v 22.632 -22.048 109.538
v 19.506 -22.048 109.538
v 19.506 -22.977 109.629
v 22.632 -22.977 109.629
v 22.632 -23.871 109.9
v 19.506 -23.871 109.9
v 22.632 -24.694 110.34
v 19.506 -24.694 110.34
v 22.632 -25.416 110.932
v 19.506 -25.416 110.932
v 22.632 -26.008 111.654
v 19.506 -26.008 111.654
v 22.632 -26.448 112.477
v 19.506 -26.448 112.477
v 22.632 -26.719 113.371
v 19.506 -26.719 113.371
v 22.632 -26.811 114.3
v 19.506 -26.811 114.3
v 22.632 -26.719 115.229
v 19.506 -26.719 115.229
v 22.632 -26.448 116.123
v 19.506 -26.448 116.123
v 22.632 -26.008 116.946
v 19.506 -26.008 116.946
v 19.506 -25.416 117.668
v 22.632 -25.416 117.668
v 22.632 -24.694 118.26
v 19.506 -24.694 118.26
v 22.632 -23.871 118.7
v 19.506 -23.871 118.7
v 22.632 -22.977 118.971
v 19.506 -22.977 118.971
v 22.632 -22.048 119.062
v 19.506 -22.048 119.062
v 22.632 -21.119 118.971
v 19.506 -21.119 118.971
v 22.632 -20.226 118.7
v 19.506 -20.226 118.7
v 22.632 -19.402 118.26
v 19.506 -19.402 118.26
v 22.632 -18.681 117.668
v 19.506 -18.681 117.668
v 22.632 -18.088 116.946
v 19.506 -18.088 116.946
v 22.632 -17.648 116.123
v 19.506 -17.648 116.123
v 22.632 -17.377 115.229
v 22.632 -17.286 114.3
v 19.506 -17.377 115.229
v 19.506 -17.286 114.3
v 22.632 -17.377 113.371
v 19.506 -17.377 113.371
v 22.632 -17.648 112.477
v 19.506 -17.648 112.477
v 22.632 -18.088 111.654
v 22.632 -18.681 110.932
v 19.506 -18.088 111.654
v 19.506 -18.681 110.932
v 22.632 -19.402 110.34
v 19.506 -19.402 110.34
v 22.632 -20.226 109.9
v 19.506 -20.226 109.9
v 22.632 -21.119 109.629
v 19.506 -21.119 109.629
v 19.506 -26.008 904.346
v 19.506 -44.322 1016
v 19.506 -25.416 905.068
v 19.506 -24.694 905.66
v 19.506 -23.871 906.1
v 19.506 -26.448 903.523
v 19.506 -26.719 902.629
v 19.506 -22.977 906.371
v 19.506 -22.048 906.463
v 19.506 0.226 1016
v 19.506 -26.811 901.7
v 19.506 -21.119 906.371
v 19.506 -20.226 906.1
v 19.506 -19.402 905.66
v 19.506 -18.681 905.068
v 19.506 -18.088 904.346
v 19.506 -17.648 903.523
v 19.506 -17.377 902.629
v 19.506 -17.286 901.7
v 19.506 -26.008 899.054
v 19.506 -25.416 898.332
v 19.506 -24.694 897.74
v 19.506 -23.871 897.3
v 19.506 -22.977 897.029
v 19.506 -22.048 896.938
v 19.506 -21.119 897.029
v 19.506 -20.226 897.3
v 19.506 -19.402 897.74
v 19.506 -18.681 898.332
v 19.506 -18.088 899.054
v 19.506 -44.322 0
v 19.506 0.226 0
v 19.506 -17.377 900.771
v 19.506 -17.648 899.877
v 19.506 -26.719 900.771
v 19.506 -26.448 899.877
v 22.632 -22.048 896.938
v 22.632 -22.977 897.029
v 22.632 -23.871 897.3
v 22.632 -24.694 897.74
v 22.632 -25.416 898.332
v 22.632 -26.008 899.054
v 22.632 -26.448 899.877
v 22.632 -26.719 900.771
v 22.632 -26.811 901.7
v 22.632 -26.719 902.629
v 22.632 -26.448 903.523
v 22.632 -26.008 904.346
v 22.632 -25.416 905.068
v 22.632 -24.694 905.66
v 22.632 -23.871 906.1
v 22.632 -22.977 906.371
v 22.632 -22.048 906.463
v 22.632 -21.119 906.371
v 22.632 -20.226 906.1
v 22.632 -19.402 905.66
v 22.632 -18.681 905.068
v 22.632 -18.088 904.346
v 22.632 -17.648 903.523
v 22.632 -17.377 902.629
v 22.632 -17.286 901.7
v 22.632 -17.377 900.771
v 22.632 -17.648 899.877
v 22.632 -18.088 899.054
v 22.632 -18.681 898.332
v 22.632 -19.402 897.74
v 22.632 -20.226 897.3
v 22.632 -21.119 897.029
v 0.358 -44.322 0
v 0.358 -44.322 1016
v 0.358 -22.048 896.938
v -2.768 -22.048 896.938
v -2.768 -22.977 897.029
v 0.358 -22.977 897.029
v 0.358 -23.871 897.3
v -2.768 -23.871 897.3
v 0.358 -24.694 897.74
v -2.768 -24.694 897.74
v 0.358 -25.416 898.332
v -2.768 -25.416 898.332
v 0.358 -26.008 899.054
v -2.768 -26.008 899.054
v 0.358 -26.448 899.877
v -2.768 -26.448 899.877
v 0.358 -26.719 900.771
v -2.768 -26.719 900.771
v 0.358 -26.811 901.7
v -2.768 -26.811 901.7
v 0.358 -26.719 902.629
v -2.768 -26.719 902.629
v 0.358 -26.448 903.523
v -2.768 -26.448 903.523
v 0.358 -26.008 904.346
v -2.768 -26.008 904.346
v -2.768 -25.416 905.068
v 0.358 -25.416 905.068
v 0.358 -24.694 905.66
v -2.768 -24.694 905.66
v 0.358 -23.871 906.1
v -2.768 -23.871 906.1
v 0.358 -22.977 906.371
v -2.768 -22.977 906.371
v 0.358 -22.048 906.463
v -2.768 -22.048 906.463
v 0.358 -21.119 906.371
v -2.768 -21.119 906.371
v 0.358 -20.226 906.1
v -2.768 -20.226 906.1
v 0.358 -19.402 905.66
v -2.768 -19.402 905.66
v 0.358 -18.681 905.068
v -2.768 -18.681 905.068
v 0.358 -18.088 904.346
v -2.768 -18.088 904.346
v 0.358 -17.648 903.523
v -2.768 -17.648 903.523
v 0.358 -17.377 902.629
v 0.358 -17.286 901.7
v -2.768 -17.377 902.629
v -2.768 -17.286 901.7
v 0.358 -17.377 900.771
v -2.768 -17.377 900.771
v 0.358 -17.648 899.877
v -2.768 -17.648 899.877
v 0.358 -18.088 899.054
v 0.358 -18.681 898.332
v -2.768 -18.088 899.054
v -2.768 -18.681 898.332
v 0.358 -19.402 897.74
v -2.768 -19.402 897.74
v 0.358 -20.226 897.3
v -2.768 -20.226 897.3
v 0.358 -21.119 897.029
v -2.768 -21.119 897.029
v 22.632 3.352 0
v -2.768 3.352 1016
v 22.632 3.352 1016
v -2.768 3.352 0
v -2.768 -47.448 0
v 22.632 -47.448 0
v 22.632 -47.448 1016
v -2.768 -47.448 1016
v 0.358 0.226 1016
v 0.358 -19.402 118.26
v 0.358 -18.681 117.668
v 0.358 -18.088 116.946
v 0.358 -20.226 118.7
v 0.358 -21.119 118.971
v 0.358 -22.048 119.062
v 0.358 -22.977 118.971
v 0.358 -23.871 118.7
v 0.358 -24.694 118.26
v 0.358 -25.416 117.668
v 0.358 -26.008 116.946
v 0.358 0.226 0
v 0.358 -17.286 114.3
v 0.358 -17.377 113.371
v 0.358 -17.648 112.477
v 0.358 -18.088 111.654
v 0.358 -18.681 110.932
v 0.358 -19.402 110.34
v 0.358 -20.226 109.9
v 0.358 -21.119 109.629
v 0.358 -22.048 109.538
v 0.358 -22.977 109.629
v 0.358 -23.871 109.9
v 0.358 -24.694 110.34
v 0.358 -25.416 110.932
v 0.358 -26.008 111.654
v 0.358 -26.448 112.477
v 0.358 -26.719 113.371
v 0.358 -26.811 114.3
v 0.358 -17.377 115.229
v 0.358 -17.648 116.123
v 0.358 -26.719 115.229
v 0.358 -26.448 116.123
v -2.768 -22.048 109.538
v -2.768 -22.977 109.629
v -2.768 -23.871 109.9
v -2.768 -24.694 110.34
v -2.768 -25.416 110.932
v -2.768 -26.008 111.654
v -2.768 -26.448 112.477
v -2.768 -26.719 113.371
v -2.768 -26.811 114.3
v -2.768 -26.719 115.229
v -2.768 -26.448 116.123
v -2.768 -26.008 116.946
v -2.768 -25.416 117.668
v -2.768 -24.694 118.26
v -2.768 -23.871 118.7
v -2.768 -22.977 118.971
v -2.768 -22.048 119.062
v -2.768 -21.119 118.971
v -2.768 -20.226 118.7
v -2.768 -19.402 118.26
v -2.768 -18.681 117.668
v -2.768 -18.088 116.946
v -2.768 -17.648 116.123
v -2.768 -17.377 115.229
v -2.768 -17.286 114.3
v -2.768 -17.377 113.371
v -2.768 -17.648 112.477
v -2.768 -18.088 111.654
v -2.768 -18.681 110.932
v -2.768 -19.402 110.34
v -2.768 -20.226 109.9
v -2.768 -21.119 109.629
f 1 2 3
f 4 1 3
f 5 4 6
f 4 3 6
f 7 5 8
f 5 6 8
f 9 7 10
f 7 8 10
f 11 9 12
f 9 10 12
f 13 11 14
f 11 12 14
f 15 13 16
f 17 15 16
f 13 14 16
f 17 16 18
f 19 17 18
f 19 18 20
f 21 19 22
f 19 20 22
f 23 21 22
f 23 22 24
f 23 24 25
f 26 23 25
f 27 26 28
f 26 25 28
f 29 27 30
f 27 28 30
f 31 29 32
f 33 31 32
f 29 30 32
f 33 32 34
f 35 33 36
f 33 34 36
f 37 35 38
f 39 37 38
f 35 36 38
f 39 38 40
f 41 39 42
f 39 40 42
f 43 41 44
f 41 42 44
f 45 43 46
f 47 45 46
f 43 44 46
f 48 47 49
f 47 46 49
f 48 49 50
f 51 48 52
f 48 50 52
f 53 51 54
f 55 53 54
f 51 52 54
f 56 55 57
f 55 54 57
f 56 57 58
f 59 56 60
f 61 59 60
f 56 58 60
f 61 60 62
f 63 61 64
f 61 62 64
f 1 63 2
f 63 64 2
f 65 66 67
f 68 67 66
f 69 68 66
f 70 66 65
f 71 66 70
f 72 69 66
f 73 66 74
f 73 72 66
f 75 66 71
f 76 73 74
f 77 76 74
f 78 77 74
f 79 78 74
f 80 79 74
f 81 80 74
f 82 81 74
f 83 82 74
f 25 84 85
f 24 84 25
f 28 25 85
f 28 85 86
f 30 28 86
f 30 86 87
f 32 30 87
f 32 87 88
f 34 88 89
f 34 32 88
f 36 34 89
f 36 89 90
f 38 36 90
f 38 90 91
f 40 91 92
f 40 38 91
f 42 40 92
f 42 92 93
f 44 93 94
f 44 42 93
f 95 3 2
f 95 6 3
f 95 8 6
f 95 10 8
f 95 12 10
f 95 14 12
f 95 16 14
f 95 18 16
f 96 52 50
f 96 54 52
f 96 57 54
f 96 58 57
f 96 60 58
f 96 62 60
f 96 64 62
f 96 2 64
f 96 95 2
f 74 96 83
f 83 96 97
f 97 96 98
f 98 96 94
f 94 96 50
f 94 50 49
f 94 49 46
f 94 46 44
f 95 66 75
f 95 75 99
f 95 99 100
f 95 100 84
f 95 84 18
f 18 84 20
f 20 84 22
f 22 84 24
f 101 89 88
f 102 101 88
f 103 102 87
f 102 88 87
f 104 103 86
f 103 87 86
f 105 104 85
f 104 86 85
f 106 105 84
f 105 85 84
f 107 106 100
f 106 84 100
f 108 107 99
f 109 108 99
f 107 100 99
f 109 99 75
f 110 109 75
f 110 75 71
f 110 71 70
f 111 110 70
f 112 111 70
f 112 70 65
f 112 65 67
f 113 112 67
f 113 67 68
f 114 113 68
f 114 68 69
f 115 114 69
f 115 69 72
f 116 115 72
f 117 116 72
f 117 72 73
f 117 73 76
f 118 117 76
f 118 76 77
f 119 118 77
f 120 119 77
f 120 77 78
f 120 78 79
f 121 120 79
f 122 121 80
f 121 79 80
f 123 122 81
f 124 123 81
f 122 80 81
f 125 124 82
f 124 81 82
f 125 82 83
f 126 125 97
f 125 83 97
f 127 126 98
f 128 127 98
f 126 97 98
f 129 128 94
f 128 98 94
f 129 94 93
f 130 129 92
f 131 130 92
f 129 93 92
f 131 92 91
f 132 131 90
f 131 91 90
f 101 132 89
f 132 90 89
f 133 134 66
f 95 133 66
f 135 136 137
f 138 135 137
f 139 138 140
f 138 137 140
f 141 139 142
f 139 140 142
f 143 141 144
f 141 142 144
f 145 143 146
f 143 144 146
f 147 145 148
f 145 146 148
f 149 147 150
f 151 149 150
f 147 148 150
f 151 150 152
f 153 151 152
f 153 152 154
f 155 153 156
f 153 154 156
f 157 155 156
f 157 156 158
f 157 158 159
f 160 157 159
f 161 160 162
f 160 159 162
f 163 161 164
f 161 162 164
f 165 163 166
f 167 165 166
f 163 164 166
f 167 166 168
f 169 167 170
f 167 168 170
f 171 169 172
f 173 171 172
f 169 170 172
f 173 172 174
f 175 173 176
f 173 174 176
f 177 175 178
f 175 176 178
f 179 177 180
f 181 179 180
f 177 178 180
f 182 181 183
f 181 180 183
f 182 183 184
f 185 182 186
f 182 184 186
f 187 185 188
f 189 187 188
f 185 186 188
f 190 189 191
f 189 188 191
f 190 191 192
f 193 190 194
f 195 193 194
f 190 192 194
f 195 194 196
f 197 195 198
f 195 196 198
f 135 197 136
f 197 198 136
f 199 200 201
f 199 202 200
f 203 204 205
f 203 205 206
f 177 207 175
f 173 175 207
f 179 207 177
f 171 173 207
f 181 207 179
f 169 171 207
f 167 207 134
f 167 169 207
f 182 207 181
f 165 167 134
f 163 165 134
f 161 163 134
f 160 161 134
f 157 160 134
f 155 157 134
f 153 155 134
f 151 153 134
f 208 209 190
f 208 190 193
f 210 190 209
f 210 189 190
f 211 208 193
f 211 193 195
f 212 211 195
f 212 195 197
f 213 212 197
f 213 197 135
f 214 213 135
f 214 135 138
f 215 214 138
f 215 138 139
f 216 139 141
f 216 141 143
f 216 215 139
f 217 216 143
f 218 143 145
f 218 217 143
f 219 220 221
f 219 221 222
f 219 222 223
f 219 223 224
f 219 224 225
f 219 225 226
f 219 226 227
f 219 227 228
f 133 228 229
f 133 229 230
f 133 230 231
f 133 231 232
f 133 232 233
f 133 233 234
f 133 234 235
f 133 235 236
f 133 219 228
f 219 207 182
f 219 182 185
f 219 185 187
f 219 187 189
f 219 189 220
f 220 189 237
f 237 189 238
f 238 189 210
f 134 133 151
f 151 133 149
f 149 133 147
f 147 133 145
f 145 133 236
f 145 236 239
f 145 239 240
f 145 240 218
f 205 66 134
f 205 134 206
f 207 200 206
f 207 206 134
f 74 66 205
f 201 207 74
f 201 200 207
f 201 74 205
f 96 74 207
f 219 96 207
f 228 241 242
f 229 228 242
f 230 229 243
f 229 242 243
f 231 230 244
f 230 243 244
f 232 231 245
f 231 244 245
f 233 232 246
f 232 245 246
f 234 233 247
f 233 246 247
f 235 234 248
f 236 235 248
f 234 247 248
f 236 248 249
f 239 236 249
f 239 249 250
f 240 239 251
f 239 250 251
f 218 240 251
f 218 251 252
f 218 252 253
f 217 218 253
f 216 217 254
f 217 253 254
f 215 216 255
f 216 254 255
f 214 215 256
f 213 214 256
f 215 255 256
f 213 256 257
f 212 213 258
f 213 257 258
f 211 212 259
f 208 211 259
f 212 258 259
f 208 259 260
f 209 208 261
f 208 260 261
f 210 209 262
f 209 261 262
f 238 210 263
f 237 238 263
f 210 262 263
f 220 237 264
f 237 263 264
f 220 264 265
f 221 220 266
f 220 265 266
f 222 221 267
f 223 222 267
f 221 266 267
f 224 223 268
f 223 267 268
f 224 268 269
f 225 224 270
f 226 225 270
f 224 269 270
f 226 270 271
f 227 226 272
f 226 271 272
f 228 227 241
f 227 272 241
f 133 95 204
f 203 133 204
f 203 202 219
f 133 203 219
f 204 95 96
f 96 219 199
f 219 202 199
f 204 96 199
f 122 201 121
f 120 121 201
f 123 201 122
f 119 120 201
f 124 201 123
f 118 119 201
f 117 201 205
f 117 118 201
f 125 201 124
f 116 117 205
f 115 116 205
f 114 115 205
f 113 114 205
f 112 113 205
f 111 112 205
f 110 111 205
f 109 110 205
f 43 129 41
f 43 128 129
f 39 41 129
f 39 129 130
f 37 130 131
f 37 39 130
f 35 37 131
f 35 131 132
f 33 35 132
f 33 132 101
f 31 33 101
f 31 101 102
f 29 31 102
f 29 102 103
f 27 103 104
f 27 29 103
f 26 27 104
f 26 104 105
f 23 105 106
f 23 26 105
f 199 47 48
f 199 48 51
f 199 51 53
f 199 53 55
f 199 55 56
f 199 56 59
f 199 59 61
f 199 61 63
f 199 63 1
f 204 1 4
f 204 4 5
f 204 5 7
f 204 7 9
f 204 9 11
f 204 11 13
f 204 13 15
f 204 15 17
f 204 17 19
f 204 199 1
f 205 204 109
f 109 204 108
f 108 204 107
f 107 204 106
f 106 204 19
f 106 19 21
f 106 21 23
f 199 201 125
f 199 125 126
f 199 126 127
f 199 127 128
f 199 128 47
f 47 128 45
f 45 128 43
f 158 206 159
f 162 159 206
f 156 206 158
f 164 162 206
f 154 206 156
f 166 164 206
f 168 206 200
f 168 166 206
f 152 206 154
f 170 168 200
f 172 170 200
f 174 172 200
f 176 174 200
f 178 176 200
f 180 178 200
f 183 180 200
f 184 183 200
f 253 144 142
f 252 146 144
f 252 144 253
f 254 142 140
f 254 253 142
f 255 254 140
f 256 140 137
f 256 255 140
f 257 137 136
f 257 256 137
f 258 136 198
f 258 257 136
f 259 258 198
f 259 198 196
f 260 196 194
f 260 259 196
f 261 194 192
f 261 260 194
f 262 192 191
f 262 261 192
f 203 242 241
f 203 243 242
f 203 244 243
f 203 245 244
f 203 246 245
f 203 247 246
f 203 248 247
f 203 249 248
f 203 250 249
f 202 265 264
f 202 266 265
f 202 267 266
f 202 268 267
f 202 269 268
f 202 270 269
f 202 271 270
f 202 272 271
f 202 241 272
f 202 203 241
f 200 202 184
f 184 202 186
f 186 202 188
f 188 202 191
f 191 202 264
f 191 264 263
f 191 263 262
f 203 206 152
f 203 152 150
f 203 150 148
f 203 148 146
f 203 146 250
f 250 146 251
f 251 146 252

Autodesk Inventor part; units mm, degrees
ref_plane "YZ Plane" through (0, 0, 0) normal (1, 0, 0) x (0, 1, 0)
ref_plane "XZ Plane" through (0, 0, 0) normal (0, 1, 0) x (-1, 0, 0)
ref_plane "XY Plane" through (0, 0, 0) normal (0, 0, 1) x (1, 0, 0)
sketch "Sketch1" plane through (0, 0, 0) normal (0, 0, 1) x (1, 0, 0)
  line L0 (-2.7678, 3.3517) -> (22.6322, 3.3517)
  line L1 (22.6322, 3.3517) -> (22.6322, -47.4483)
  line L2 (22.6322, -47.4483) -> (-2.7678, -47.4483)
  line L3 (-2.7678, -47.4483) -> (-2.7678, 3.3517)
  line L4 (19.5061, 0.2256) -> (0.3583, 0.2256)
  line L5 (0.3583, 0.2256) -> (0.3583, -44.3222)
  line L6 (0.3583, -44.3222) -> (19.5061, -44.3222)
  line L7 (19.5061, -44.3222) -> (19.5061, 0.2256)
  point P0 (0, 0)
  dimension "d0" = 25.4
  dimension "d1" = 50.8
extrude "Extrusion1" add sketch "Sketch1" along normal blind 1016
sketch "Sketch2" plane through (-2.7678, 3.3517, 0) normal (0, 1, 0) x (1, 0, 0)
  point P0 (2.7678, 0)
sketch "Sketch3" plane through (22.6322, -47.4483, 0) normal (1, 0, 0) x (0, 0, -1)
  line L0 (0, 0) -> (-1016, 0) projected
  line L1 (0, 50.8) -> (-114.3, 50.8)
  line L2 (-114.3, 50.8) -> (-114.3, 0)
  line L3 (-114.3, 0) -> (0, 0)
  line L4 (0, 0) -> (0, 50.8)
  line L5 (-1016, 50.8) -> (-901.7, 50.8)
  line L6 (-901.7, 50.8) -> (-901.7, 0)
  line L7 (-901.7, 0) -> (-1016, 0)
  line L8 (-1016, 0) -> (-1016, 50.8)
  point P0 (0, 47.4483)
  point P1 (-114.3, 25.4)
  point P2 (-901.7, 25.4)
  dimension "d4" = 114.3
  dimension "d5" = 114.3
hole "Hole1" at (22.6322, -22.0483, 901.7) at (22.6322, -22.0483, 114.3) direction (-1, 0, 0) diameter 9.525 end through all
properties part number "40in 2x1 boxbeam"
